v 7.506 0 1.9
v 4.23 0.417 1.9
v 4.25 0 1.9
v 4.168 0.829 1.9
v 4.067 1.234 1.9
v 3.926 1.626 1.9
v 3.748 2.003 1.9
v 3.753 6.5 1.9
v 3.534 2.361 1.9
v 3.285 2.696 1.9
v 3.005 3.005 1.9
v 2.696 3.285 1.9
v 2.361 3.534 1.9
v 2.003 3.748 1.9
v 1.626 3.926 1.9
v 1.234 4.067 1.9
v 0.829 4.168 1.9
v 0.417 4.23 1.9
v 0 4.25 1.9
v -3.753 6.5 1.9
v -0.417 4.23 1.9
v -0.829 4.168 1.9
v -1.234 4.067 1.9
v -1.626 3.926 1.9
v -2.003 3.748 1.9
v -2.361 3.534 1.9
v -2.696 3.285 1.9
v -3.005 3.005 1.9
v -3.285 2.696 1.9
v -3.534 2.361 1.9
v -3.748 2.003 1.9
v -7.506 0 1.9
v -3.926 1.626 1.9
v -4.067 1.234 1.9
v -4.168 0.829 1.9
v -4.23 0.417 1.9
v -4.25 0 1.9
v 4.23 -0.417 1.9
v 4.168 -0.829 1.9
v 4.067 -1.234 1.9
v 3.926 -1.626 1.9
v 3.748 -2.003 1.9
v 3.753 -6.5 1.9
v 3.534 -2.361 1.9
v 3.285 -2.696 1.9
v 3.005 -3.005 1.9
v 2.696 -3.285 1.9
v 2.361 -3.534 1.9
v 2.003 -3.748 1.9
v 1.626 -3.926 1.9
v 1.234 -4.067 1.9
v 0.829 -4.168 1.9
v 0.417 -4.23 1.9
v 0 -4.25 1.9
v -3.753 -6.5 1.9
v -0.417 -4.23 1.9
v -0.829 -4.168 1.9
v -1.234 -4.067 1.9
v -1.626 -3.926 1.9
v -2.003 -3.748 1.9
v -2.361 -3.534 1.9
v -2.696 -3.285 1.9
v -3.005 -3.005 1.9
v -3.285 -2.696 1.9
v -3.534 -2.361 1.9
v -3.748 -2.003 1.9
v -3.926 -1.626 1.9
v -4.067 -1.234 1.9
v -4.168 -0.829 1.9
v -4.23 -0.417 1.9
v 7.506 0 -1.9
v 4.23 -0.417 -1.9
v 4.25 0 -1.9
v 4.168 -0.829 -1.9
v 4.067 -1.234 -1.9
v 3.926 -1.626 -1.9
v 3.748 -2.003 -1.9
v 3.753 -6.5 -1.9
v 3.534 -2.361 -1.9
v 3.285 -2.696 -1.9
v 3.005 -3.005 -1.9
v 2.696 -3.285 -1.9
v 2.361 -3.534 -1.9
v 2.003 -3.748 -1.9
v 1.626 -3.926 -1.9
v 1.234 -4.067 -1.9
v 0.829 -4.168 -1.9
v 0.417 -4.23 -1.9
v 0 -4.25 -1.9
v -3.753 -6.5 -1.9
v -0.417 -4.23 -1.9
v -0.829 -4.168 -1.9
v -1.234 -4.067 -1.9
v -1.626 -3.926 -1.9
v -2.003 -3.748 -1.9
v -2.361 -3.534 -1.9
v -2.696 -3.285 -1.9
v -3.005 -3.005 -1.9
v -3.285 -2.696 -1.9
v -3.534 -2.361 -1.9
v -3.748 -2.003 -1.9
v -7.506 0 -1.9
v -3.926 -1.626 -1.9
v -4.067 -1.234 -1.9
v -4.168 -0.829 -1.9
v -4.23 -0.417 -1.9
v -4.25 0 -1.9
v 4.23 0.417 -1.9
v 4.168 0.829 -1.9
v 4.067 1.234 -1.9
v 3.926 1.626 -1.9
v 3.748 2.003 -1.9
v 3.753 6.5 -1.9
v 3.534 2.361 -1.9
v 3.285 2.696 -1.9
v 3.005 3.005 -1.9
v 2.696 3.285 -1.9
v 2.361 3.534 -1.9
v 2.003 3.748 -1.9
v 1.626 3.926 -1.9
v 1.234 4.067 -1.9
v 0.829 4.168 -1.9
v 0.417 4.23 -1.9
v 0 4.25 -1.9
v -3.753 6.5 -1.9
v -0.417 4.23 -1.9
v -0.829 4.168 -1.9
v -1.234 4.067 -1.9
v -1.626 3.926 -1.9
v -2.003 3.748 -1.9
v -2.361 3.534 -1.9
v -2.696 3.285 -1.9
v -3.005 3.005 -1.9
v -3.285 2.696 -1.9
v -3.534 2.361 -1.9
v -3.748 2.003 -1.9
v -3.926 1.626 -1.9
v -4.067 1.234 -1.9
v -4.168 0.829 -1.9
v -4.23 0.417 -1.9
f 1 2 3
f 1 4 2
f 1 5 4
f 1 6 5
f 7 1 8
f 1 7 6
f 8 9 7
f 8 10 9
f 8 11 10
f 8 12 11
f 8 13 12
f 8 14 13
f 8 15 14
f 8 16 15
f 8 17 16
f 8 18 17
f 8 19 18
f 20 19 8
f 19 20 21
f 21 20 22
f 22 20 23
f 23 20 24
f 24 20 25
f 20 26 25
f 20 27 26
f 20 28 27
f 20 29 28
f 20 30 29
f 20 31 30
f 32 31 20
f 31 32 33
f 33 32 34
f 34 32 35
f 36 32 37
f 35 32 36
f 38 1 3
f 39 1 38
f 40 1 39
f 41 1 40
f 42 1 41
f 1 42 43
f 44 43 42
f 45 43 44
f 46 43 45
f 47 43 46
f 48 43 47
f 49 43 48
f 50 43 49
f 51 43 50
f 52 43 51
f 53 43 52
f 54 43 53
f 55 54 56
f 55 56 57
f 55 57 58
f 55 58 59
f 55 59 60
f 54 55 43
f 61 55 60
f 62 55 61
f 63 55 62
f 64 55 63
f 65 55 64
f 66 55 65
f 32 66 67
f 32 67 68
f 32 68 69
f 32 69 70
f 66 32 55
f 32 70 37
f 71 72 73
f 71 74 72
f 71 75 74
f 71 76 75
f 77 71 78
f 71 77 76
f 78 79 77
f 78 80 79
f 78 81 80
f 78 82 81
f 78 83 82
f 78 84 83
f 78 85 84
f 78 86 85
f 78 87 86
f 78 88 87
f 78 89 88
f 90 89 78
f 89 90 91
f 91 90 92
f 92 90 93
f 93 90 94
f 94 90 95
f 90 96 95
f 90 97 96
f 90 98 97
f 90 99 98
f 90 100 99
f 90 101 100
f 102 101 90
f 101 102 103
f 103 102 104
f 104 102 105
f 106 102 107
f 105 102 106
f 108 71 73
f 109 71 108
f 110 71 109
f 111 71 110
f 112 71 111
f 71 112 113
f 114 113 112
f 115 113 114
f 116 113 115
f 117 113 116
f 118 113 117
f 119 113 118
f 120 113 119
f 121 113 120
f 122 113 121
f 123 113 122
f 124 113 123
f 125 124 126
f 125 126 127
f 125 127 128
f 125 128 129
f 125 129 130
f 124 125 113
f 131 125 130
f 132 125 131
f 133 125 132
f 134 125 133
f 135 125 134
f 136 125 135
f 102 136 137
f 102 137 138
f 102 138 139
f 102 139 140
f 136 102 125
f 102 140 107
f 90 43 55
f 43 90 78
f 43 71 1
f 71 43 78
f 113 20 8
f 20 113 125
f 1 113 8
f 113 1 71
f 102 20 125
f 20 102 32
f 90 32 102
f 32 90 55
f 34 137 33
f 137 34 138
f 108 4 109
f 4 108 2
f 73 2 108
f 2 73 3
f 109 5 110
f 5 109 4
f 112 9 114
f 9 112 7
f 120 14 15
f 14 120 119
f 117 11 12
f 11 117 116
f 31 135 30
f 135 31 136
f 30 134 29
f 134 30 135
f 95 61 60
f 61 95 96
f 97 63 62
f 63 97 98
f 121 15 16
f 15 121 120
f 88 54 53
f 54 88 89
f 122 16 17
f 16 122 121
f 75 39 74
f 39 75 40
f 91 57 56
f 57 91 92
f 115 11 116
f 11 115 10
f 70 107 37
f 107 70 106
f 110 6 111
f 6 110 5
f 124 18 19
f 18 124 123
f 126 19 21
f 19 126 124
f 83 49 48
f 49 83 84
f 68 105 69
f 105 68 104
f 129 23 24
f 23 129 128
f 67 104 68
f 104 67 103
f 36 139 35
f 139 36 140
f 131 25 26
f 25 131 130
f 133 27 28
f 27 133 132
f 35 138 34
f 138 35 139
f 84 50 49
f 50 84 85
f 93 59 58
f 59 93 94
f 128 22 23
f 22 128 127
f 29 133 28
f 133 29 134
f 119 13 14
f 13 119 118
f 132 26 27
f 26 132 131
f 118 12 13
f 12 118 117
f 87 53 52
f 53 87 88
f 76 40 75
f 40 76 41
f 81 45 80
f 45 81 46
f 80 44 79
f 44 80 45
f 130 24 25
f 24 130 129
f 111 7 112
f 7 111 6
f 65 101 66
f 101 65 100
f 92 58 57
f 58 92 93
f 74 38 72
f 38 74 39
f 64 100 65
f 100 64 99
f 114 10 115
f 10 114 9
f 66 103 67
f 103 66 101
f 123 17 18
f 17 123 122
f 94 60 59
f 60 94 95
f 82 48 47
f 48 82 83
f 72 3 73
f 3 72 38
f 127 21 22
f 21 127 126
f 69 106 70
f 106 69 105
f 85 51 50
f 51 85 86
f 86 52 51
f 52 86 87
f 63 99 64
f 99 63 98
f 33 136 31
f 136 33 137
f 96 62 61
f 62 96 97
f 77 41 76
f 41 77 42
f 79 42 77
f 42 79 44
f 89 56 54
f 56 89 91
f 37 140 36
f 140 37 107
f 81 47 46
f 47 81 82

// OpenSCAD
// Thin hex nut for 8.0mm screws, 13.0mm across flats, 4.0mm thick

// Parameters
thread_diameter_mm = 8.0; //[4.0:16.0:0.1]
across_flats_mm = 13.0;   //[6.5:26.0:0.1]
thickness_mm = 4.0;       //[2.0:8.0:0.1]
edge_break_mm = 0.3;      //[0.1:1.0:0.05]
clearance_extra_mm = 0.5; //[0.0:1.5:0.05]
hole_is_clearance = 1;    //[0:1:1]
eps_mm = 0.2;             //[0.05:0.5:0.05]

// Derived
hex_R_mm = across_flats_mm / (2 * cos(30)); // circumradius for $fn=6 cylinder
hole_r_mm = (thread_diameter_mm + hole_is_clearance * clearance_extra_mm) / 2;

// Hex nut body (no washer/flange)
module hex_nut_body() {
  cylinder(r=hex_R_mm, h=thickness_mm, center=true, $fn=6);
}

// Central through hole
module central_through_hole() {
  cylinder(r=hole_r_mm, h=thickness_mm + 2*eps_mm, center=true, $fn=64);
}

// Small edge breaks (chamfers) on top and bottom outer edges
module outer_edge_breaks() {
  // Top chamfer ring
  translate([0, 0, thickness_mm/2 - edge_break_mm/2 + eps_mm])
    cylinder(r1=hex_R_mm + edge_break_mm, r2=hex_R_mm - edge_break_mm,
             h=edge_break_mm, center=true, $fn=6);

  // Bottom chamfer ring
  translate([0, 0, -thickness_mm/2 + edge_break_mm/2 - eps_mm])
    cylinder(r1=hex_R_mm - edge_break_mm, r2=hex_R_mm + edge_break_mm,
             h=edge_break_mm, center=true, $fn=6);
}

// Assembly
difference() {
  hex_nut_body();
  central_through_hole();
  outer_edge_breaks();
}
